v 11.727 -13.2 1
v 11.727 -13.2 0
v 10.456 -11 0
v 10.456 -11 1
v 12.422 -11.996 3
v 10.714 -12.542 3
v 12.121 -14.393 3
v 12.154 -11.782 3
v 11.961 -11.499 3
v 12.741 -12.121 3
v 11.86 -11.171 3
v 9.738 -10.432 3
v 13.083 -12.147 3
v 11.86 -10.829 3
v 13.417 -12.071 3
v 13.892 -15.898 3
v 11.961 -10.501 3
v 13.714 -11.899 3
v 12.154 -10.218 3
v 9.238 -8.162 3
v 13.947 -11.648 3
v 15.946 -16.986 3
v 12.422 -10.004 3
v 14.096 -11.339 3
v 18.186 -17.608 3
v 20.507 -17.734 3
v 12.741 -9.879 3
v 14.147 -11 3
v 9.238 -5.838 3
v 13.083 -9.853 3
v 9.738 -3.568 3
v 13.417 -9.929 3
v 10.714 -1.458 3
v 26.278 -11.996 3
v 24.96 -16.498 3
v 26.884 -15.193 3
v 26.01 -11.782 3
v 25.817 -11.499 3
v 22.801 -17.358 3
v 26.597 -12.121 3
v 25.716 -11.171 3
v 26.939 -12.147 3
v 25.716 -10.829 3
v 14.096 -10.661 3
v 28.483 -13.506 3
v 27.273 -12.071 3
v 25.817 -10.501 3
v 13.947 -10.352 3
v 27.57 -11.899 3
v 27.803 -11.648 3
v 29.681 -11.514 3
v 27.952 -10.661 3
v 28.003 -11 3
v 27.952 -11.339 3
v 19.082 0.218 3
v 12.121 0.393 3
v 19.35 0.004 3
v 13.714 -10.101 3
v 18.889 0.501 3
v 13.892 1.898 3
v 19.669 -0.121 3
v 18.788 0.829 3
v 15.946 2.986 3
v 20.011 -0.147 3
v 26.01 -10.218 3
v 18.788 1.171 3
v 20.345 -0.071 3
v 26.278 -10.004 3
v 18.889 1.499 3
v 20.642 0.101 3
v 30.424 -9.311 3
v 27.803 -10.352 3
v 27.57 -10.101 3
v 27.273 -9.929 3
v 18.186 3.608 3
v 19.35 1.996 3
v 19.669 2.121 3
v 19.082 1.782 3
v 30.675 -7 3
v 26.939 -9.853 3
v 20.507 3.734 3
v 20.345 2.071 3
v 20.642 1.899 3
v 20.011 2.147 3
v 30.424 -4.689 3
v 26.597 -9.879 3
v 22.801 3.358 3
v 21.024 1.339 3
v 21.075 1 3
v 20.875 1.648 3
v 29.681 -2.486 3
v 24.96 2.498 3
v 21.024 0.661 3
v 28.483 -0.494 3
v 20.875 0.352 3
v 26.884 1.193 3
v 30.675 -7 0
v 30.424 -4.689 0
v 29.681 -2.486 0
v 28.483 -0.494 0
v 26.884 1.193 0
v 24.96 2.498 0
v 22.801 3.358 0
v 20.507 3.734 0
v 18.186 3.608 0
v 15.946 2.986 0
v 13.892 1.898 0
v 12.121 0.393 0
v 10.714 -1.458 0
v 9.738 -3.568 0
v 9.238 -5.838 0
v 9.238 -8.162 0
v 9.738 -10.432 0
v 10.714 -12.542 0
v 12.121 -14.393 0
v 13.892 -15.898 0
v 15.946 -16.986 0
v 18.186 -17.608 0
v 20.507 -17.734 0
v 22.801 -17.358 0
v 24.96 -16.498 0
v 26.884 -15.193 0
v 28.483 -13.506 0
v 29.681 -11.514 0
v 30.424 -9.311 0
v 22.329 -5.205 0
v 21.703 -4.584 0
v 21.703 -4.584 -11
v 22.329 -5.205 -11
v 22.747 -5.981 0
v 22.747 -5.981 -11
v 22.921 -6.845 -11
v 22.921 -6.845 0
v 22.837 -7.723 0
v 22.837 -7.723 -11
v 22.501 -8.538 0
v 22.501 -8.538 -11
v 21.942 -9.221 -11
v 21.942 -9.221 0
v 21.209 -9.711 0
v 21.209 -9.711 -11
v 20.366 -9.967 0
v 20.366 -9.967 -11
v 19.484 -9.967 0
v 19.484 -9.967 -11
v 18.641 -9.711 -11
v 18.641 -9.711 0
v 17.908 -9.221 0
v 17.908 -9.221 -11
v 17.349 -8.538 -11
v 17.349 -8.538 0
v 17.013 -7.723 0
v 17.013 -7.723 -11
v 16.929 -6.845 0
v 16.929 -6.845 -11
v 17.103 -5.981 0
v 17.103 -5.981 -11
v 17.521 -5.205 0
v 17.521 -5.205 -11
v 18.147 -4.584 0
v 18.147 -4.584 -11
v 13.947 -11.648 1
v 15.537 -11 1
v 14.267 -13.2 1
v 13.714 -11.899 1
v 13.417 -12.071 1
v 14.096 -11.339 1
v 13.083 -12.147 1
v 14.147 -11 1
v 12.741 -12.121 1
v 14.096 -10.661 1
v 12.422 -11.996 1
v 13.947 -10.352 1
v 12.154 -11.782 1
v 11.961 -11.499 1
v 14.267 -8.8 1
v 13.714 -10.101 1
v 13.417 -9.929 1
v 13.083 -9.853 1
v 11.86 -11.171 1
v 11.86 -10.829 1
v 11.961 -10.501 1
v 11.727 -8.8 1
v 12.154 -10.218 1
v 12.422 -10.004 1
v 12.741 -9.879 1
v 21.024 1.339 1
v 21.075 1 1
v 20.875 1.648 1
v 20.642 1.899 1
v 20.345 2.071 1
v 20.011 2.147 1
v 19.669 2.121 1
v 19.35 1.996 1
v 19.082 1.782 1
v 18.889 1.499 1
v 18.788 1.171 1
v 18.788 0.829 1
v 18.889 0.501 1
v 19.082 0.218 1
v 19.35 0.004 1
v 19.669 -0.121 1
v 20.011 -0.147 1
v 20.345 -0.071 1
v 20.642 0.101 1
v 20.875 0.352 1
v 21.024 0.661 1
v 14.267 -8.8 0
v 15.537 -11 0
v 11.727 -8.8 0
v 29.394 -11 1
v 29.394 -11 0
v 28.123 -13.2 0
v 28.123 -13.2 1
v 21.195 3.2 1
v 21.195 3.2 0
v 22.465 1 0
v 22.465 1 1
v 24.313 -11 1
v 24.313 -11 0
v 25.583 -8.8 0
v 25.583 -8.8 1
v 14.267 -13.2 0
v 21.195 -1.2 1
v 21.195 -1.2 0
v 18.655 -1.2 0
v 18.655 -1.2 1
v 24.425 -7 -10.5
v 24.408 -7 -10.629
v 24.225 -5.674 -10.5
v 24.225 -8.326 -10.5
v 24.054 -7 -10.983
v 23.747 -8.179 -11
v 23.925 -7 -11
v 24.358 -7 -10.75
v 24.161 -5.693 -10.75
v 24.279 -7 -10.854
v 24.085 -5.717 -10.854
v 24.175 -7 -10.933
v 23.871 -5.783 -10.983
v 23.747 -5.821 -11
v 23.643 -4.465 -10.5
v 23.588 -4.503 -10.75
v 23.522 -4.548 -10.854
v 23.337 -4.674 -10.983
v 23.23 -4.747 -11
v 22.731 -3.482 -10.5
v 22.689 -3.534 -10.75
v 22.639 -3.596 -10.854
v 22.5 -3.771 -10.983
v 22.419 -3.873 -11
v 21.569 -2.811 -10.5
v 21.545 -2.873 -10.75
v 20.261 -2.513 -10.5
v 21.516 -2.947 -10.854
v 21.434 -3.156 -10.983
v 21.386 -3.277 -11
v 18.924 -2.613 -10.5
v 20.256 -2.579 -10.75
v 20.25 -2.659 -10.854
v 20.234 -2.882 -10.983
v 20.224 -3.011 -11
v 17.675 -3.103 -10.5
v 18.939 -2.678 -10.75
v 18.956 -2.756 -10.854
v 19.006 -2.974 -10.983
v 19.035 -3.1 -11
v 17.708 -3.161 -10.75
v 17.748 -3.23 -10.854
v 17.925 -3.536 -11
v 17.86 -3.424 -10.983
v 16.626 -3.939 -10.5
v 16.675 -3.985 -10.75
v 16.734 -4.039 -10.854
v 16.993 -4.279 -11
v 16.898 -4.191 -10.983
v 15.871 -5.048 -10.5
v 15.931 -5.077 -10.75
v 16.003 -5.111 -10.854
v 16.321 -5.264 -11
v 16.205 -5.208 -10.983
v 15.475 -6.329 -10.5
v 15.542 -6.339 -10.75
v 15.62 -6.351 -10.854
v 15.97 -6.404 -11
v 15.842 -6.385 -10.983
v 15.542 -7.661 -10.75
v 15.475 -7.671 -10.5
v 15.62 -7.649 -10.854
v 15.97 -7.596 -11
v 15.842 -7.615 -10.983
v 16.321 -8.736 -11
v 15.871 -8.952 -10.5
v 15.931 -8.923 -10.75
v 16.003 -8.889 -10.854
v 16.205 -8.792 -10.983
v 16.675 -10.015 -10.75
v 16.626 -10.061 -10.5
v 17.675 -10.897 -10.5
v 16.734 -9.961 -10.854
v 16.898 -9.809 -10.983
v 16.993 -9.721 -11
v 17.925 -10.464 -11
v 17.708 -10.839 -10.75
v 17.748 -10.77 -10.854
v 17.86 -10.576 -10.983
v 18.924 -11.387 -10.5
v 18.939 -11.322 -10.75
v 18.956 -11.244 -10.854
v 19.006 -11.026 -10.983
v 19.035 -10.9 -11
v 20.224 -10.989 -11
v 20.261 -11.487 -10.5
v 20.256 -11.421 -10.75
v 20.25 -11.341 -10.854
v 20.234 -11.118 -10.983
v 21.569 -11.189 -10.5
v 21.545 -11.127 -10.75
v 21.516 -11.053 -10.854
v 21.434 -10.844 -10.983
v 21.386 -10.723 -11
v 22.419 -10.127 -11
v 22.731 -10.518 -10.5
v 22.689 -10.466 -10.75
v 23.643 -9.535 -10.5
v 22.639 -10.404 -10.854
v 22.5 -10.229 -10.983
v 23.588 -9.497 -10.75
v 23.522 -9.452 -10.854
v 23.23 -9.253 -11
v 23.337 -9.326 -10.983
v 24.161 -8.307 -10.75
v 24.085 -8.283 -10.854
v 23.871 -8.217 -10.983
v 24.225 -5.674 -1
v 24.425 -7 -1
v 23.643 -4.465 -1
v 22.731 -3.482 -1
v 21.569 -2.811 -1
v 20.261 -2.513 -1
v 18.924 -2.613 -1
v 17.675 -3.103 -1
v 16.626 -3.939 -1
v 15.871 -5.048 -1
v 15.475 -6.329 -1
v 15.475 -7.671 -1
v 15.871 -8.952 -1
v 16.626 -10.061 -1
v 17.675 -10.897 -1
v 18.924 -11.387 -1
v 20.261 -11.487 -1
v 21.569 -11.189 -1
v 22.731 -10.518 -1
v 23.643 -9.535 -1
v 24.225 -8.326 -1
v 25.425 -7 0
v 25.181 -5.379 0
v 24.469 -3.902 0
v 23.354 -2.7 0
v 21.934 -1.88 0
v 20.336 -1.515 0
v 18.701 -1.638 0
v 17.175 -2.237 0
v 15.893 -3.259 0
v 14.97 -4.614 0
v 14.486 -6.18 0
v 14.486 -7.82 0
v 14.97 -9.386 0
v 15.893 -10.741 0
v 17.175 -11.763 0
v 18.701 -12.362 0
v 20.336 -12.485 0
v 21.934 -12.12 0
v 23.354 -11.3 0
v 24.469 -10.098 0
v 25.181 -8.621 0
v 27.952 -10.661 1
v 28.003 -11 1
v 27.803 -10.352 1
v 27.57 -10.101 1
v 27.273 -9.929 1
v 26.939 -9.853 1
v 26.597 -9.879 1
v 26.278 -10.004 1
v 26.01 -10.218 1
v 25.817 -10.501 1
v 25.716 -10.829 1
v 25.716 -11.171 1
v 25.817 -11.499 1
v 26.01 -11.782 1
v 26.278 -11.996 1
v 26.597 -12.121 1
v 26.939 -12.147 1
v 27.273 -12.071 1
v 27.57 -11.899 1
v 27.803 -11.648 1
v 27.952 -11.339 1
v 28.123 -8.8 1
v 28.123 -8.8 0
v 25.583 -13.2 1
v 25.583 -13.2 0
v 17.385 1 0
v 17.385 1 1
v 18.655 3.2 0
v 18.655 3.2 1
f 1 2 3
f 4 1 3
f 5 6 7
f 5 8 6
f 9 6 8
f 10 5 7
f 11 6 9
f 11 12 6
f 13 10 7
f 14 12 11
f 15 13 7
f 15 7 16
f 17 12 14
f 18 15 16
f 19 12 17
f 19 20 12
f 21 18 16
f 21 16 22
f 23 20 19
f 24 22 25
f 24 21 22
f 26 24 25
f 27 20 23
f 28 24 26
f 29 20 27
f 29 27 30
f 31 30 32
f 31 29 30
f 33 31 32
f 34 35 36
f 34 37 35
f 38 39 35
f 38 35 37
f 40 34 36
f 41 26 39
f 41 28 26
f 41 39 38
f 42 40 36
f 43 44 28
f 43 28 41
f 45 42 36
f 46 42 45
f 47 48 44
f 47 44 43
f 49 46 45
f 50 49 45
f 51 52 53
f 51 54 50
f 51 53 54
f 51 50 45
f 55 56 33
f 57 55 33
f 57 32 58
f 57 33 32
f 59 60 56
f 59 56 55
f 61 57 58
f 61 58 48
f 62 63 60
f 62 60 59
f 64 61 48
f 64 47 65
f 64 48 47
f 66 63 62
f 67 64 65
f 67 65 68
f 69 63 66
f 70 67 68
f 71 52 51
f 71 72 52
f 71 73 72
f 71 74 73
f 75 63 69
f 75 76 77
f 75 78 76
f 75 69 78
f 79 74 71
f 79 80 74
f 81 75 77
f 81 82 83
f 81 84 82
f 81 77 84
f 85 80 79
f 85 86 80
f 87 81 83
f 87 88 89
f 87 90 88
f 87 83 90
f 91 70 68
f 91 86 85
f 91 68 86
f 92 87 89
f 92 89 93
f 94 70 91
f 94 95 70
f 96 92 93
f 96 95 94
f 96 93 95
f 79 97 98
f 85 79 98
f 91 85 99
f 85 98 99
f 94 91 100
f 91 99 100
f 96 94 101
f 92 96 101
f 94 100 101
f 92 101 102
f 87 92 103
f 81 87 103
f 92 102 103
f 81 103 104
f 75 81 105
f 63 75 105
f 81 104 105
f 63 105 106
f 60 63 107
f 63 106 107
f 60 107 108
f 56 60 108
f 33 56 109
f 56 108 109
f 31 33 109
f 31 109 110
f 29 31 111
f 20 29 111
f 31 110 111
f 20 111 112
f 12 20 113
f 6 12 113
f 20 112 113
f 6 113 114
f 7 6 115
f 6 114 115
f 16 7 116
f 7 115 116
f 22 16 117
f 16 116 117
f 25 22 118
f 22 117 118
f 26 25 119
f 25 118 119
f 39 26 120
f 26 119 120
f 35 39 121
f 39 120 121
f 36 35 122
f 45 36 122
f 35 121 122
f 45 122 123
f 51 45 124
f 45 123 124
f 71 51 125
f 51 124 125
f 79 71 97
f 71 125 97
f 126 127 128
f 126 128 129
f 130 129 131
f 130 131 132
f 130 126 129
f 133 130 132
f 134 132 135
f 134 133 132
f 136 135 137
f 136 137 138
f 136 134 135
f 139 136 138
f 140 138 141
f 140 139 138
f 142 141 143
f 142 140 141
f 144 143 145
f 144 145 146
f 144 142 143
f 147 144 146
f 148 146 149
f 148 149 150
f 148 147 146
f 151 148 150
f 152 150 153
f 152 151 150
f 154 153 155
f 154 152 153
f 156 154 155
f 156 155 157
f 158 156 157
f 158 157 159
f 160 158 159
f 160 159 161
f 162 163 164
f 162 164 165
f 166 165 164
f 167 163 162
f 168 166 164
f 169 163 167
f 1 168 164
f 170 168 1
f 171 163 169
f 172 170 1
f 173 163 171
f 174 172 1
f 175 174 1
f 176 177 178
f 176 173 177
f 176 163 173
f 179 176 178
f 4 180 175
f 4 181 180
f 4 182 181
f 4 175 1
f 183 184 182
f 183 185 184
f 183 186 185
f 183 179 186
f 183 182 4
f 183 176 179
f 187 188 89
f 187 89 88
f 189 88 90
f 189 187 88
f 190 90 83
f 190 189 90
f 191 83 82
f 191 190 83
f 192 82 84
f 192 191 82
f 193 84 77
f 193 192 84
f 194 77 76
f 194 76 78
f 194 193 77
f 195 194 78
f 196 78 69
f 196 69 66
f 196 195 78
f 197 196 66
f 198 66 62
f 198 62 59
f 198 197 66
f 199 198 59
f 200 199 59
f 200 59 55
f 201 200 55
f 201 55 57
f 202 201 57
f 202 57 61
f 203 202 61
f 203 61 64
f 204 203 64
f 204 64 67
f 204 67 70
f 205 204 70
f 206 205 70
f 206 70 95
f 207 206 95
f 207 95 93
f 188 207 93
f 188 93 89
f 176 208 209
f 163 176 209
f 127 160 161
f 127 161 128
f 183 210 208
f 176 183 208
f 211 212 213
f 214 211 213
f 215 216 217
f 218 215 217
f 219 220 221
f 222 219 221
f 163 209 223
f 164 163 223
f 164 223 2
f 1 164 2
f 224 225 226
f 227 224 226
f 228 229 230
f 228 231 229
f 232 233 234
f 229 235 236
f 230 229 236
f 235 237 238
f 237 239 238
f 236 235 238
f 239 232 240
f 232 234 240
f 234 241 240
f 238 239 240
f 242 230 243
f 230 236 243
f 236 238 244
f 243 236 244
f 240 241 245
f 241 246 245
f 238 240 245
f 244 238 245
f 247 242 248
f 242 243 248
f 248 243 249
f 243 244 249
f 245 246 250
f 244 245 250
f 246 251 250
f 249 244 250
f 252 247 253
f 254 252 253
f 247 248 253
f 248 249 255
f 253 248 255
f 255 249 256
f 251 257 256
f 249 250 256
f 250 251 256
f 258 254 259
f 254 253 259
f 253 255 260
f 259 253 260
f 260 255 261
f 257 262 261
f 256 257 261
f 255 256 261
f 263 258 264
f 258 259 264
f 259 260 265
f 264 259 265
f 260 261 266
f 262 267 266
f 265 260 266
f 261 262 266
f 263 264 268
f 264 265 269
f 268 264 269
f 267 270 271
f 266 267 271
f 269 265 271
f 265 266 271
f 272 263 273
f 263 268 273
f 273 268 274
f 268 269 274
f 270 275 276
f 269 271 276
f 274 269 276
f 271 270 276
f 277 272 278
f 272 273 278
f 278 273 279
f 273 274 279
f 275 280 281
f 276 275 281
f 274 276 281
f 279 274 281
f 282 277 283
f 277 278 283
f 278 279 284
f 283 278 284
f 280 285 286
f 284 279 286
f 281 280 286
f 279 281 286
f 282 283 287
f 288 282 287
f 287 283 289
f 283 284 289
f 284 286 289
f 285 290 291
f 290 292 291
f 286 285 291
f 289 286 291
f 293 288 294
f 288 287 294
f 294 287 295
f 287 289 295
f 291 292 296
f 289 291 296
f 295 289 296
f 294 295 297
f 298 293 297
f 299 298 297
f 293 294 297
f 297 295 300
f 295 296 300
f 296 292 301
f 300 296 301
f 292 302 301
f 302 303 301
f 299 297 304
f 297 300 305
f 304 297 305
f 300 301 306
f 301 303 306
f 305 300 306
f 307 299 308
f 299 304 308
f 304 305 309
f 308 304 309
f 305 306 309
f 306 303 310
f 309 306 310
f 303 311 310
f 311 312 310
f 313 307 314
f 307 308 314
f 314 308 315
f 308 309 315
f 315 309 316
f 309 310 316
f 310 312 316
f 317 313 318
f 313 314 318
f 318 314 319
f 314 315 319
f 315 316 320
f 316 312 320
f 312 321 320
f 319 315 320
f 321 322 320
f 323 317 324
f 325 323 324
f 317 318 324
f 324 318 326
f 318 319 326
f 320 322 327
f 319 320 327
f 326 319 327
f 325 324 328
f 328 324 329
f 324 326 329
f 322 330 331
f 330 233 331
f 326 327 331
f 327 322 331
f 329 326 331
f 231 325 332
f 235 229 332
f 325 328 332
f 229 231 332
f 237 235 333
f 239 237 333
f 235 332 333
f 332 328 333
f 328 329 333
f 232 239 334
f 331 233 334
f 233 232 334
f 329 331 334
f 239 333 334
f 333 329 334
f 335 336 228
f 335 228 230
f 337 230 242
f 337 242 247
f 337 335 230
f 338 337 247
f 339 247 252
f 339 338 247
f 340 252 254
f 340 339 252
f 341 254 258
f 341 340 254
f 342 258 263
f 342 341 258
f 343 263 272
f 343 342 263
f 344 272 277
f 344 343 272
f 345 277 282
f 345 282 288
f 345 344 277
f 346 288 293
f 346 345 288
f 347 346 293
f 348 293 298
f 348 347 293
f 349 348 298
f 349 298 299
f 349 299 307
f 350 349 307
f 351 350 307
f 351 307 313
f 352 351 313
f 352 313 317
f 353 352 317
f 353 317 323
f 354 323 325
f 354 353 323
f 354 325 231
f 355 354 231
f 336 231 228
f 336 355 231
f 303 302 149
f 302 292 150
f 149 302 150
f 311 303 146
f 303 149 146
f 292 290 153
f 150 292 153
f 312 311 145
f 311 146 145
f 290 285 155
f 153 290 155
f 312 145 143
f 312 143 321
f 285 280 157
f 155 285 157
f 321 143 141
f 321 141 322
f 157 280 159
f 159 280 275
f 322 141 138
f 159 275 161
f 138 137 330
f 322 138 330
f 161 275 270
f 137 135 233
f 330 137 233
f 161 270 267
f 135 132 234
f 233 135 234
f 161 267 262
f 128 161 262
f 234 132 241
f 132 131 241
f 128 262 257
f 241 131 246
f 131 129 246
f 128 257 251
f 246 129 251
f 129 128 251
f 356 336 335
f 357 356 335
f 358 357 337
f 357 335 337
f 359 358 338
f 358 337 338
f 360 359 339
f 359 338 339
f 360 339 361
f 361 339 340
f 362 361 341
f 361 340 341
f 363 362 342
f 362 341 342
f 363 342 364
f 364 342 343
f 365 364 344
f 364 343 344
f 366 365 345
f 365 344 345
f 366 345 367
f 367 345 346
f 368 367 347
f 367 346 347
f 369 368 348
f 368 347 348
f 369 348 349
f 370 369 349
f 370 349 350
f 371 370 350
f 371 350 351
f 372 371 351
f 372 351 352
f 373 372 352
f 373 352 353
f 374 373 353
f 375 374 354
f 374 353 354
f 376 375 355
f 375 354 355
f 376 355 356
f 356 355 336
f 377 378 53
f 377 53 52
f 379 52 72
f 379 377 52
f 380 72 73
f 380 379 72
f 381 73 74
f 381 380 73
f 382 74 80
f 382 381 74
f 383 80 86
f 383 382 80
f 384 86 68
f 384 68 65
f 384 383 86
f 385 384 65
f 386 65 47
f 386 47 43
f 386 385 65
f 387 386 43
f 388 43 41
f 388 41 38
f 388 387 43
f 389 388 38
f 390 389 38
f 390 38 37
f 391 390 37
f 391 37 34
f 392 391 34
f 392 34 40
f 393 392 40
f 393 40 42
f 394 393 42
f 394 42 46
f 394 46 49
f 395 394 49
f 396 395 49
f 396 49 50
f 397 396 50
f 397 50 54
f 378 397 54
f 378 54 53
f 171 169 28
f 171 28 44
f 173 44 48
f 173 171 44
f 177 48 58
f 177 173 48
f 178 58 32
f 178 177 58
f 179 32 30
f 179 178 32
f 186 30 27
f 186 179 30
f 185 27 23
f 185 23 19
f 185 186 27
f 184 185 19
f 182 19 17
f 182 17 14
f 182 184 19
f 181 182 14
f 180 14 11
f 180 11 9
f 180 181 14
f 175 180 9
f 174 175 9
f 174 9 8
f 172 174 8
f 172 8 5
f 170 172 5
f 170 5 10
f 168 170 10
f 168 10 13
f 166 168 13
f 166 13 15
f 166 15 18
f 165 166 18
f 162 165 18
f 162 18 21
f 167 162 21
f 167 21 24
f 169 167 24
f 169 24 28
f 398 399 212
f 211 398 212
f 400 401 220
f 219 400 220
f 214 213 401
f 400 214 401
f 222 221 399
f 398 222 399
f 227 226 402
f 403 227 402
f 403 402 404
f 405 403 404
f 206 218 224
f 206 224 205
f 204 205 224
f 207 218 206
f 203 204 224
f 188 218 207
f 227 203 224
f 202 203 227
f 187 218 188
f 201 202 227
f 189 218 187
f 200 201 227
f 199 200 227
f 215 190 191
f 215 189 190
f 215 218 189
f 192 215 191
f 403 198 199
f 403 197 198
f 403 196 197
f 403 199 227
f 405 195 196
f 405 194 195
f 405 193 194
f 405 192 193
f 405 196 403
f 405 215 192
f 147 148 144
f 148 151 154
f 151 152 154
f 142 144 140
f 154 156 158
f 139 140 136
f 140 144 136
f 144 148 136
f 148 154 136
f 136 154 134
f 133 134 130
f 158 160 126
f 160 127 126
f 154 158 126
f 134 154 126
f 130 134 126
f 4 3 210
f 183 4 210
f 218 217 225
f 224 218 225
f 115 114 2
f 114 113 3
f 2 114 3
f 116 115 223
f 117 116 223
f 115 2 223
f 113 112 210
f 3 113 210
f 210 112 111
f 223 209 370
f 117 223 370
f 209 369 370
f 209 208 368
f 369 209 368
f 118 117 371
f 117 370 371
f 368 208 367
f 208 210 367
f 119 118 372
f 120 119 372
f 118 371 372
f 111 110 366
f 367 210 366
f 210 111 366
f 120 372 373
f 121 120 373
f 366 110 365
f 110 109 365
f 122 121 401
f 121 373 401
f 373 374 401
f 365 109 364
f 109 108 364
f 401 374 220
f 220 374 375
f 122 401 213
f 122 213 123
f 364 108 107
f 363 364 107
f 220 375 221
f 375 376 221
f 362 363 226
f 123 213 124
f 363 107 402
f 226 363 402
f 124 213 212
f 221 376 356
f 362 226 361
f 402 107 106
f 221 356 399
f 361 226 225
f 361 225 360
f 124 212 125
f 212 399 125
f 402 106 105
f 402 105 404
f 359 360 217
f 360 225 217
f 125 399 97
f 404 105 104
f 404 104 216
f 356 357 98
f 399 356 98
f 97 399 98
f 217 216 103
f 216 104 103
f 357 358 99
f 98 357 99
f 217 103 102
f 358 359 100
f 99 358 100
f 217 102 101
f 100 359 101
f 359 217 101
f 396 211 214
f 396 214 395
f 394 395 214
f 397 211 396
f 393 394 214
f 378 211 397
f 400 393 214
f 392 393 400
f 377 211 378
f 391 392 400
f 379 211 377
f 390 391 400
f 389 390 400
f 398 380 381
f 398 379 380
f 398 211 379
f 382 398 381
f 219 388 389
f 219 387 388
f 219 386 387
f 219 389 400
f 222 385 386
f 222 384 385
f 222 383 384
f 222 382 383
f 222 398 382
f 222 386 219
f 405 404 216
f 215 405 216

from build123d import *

# Parameters (mm, degrees)
SKETCH1_R           = 4.5
BOSS_EXTRUDE1_DEPTH = 11
SKETCH2_R           = 10.75
SKETCH2_R_2         = 1.15
BOSS_EXTRUDE2_DEPTH = 3
CUT_EXTRUDE1_DEPTH  = 1
CHAMFER1_SIZE       = 1
FILLET1_R           = 0.5


with BuildPart() as part:
    # Sketch1 → Boss-Extrude1 (new body)
    with BuildSketch(Plane.XY):
        with Locations((19.925, -7)):
            Circle(SKETCH1_R)
        with BuildLine():
            Line((18.146986881, -4.583666134), (21.703013119, -4.583666134))
            ThreePointArc((21.703013119, -4.583666134), (19.925, -10), (18.146986881, -4.583666134))
        make_face(mode=Mode.SUBTRACT)
    extrude(amount=-BOSS_EXTRUDE1_DEPTH)

    # Sketch2 → Boss-Extrude2 (add)
    with BuildSketch(Plane.XY):
        with Locations((19.925, -7)):
            Circle(SKETCH2_R)
        with Locations((19.925, 1)):
            Circle(SKETCH2_R_2, mode=Mode.SUBTRACT)
        with Locations((12.99679677, -11)):
            Circle(SKETCH2_R_2, mode=Mode.SUBTRACT)
        with Locations((26.85320323, -11)):
            Circle(SKETCH2_R_2, mode=Mode.SUBTRACT)
    extrude(amount=BOSS_EXTRUDE2_DEPTH)

    # Sketch3 → Cut-Extrude1 (cut)
    with BuildSketch(Plane(origin=(0, 0, 0), x_dir=(-1, 0, 0), z_dir=(0, 0, -1))):
        Polygon((-25.583032638, -8.8), (-28.123373822, -8.8), (-29.393544415, -11), (-28.123373822, -13.2), (-25.583032638, -13.2), (-24.312862046, -11), align=None)
        Polygon((-22.465341184, 1), (-21.195170592, -1.2), (-18.654829408, -1.2), (-17.384658816, 1), (-18.654829408, 3.2), (-21.195170592, 3.2), align=None)
        Polygon((-14.266967362, -8.8), (-15.537137954, -11), (-14.266967362, -13.2), (-11.726626178, -13.2), (-10.456455585, -11), (-11.726626178, -8.8), align=None)
    extrude(amount=-CUT_EXTRUDE1_DEPTH, mode=Mode.SUBTRACT)

    # Chamfer1
    chamfer1_edges = [part.edges().sort_by_distance(p)[0] for p in [
        (15.425, -7, 0),
    ]]
    chamfer(chamfer1_edges, length=CHAMFER1_SIZE)

    # Fillet1
    fillet1_edges = [part.edges().sort_by_distance(p)[0] for p in [
        (15.425, -7, -11),
    ]]
    fillet(fillet1_edges, radius=FILLET1_R)


solid = part.part
